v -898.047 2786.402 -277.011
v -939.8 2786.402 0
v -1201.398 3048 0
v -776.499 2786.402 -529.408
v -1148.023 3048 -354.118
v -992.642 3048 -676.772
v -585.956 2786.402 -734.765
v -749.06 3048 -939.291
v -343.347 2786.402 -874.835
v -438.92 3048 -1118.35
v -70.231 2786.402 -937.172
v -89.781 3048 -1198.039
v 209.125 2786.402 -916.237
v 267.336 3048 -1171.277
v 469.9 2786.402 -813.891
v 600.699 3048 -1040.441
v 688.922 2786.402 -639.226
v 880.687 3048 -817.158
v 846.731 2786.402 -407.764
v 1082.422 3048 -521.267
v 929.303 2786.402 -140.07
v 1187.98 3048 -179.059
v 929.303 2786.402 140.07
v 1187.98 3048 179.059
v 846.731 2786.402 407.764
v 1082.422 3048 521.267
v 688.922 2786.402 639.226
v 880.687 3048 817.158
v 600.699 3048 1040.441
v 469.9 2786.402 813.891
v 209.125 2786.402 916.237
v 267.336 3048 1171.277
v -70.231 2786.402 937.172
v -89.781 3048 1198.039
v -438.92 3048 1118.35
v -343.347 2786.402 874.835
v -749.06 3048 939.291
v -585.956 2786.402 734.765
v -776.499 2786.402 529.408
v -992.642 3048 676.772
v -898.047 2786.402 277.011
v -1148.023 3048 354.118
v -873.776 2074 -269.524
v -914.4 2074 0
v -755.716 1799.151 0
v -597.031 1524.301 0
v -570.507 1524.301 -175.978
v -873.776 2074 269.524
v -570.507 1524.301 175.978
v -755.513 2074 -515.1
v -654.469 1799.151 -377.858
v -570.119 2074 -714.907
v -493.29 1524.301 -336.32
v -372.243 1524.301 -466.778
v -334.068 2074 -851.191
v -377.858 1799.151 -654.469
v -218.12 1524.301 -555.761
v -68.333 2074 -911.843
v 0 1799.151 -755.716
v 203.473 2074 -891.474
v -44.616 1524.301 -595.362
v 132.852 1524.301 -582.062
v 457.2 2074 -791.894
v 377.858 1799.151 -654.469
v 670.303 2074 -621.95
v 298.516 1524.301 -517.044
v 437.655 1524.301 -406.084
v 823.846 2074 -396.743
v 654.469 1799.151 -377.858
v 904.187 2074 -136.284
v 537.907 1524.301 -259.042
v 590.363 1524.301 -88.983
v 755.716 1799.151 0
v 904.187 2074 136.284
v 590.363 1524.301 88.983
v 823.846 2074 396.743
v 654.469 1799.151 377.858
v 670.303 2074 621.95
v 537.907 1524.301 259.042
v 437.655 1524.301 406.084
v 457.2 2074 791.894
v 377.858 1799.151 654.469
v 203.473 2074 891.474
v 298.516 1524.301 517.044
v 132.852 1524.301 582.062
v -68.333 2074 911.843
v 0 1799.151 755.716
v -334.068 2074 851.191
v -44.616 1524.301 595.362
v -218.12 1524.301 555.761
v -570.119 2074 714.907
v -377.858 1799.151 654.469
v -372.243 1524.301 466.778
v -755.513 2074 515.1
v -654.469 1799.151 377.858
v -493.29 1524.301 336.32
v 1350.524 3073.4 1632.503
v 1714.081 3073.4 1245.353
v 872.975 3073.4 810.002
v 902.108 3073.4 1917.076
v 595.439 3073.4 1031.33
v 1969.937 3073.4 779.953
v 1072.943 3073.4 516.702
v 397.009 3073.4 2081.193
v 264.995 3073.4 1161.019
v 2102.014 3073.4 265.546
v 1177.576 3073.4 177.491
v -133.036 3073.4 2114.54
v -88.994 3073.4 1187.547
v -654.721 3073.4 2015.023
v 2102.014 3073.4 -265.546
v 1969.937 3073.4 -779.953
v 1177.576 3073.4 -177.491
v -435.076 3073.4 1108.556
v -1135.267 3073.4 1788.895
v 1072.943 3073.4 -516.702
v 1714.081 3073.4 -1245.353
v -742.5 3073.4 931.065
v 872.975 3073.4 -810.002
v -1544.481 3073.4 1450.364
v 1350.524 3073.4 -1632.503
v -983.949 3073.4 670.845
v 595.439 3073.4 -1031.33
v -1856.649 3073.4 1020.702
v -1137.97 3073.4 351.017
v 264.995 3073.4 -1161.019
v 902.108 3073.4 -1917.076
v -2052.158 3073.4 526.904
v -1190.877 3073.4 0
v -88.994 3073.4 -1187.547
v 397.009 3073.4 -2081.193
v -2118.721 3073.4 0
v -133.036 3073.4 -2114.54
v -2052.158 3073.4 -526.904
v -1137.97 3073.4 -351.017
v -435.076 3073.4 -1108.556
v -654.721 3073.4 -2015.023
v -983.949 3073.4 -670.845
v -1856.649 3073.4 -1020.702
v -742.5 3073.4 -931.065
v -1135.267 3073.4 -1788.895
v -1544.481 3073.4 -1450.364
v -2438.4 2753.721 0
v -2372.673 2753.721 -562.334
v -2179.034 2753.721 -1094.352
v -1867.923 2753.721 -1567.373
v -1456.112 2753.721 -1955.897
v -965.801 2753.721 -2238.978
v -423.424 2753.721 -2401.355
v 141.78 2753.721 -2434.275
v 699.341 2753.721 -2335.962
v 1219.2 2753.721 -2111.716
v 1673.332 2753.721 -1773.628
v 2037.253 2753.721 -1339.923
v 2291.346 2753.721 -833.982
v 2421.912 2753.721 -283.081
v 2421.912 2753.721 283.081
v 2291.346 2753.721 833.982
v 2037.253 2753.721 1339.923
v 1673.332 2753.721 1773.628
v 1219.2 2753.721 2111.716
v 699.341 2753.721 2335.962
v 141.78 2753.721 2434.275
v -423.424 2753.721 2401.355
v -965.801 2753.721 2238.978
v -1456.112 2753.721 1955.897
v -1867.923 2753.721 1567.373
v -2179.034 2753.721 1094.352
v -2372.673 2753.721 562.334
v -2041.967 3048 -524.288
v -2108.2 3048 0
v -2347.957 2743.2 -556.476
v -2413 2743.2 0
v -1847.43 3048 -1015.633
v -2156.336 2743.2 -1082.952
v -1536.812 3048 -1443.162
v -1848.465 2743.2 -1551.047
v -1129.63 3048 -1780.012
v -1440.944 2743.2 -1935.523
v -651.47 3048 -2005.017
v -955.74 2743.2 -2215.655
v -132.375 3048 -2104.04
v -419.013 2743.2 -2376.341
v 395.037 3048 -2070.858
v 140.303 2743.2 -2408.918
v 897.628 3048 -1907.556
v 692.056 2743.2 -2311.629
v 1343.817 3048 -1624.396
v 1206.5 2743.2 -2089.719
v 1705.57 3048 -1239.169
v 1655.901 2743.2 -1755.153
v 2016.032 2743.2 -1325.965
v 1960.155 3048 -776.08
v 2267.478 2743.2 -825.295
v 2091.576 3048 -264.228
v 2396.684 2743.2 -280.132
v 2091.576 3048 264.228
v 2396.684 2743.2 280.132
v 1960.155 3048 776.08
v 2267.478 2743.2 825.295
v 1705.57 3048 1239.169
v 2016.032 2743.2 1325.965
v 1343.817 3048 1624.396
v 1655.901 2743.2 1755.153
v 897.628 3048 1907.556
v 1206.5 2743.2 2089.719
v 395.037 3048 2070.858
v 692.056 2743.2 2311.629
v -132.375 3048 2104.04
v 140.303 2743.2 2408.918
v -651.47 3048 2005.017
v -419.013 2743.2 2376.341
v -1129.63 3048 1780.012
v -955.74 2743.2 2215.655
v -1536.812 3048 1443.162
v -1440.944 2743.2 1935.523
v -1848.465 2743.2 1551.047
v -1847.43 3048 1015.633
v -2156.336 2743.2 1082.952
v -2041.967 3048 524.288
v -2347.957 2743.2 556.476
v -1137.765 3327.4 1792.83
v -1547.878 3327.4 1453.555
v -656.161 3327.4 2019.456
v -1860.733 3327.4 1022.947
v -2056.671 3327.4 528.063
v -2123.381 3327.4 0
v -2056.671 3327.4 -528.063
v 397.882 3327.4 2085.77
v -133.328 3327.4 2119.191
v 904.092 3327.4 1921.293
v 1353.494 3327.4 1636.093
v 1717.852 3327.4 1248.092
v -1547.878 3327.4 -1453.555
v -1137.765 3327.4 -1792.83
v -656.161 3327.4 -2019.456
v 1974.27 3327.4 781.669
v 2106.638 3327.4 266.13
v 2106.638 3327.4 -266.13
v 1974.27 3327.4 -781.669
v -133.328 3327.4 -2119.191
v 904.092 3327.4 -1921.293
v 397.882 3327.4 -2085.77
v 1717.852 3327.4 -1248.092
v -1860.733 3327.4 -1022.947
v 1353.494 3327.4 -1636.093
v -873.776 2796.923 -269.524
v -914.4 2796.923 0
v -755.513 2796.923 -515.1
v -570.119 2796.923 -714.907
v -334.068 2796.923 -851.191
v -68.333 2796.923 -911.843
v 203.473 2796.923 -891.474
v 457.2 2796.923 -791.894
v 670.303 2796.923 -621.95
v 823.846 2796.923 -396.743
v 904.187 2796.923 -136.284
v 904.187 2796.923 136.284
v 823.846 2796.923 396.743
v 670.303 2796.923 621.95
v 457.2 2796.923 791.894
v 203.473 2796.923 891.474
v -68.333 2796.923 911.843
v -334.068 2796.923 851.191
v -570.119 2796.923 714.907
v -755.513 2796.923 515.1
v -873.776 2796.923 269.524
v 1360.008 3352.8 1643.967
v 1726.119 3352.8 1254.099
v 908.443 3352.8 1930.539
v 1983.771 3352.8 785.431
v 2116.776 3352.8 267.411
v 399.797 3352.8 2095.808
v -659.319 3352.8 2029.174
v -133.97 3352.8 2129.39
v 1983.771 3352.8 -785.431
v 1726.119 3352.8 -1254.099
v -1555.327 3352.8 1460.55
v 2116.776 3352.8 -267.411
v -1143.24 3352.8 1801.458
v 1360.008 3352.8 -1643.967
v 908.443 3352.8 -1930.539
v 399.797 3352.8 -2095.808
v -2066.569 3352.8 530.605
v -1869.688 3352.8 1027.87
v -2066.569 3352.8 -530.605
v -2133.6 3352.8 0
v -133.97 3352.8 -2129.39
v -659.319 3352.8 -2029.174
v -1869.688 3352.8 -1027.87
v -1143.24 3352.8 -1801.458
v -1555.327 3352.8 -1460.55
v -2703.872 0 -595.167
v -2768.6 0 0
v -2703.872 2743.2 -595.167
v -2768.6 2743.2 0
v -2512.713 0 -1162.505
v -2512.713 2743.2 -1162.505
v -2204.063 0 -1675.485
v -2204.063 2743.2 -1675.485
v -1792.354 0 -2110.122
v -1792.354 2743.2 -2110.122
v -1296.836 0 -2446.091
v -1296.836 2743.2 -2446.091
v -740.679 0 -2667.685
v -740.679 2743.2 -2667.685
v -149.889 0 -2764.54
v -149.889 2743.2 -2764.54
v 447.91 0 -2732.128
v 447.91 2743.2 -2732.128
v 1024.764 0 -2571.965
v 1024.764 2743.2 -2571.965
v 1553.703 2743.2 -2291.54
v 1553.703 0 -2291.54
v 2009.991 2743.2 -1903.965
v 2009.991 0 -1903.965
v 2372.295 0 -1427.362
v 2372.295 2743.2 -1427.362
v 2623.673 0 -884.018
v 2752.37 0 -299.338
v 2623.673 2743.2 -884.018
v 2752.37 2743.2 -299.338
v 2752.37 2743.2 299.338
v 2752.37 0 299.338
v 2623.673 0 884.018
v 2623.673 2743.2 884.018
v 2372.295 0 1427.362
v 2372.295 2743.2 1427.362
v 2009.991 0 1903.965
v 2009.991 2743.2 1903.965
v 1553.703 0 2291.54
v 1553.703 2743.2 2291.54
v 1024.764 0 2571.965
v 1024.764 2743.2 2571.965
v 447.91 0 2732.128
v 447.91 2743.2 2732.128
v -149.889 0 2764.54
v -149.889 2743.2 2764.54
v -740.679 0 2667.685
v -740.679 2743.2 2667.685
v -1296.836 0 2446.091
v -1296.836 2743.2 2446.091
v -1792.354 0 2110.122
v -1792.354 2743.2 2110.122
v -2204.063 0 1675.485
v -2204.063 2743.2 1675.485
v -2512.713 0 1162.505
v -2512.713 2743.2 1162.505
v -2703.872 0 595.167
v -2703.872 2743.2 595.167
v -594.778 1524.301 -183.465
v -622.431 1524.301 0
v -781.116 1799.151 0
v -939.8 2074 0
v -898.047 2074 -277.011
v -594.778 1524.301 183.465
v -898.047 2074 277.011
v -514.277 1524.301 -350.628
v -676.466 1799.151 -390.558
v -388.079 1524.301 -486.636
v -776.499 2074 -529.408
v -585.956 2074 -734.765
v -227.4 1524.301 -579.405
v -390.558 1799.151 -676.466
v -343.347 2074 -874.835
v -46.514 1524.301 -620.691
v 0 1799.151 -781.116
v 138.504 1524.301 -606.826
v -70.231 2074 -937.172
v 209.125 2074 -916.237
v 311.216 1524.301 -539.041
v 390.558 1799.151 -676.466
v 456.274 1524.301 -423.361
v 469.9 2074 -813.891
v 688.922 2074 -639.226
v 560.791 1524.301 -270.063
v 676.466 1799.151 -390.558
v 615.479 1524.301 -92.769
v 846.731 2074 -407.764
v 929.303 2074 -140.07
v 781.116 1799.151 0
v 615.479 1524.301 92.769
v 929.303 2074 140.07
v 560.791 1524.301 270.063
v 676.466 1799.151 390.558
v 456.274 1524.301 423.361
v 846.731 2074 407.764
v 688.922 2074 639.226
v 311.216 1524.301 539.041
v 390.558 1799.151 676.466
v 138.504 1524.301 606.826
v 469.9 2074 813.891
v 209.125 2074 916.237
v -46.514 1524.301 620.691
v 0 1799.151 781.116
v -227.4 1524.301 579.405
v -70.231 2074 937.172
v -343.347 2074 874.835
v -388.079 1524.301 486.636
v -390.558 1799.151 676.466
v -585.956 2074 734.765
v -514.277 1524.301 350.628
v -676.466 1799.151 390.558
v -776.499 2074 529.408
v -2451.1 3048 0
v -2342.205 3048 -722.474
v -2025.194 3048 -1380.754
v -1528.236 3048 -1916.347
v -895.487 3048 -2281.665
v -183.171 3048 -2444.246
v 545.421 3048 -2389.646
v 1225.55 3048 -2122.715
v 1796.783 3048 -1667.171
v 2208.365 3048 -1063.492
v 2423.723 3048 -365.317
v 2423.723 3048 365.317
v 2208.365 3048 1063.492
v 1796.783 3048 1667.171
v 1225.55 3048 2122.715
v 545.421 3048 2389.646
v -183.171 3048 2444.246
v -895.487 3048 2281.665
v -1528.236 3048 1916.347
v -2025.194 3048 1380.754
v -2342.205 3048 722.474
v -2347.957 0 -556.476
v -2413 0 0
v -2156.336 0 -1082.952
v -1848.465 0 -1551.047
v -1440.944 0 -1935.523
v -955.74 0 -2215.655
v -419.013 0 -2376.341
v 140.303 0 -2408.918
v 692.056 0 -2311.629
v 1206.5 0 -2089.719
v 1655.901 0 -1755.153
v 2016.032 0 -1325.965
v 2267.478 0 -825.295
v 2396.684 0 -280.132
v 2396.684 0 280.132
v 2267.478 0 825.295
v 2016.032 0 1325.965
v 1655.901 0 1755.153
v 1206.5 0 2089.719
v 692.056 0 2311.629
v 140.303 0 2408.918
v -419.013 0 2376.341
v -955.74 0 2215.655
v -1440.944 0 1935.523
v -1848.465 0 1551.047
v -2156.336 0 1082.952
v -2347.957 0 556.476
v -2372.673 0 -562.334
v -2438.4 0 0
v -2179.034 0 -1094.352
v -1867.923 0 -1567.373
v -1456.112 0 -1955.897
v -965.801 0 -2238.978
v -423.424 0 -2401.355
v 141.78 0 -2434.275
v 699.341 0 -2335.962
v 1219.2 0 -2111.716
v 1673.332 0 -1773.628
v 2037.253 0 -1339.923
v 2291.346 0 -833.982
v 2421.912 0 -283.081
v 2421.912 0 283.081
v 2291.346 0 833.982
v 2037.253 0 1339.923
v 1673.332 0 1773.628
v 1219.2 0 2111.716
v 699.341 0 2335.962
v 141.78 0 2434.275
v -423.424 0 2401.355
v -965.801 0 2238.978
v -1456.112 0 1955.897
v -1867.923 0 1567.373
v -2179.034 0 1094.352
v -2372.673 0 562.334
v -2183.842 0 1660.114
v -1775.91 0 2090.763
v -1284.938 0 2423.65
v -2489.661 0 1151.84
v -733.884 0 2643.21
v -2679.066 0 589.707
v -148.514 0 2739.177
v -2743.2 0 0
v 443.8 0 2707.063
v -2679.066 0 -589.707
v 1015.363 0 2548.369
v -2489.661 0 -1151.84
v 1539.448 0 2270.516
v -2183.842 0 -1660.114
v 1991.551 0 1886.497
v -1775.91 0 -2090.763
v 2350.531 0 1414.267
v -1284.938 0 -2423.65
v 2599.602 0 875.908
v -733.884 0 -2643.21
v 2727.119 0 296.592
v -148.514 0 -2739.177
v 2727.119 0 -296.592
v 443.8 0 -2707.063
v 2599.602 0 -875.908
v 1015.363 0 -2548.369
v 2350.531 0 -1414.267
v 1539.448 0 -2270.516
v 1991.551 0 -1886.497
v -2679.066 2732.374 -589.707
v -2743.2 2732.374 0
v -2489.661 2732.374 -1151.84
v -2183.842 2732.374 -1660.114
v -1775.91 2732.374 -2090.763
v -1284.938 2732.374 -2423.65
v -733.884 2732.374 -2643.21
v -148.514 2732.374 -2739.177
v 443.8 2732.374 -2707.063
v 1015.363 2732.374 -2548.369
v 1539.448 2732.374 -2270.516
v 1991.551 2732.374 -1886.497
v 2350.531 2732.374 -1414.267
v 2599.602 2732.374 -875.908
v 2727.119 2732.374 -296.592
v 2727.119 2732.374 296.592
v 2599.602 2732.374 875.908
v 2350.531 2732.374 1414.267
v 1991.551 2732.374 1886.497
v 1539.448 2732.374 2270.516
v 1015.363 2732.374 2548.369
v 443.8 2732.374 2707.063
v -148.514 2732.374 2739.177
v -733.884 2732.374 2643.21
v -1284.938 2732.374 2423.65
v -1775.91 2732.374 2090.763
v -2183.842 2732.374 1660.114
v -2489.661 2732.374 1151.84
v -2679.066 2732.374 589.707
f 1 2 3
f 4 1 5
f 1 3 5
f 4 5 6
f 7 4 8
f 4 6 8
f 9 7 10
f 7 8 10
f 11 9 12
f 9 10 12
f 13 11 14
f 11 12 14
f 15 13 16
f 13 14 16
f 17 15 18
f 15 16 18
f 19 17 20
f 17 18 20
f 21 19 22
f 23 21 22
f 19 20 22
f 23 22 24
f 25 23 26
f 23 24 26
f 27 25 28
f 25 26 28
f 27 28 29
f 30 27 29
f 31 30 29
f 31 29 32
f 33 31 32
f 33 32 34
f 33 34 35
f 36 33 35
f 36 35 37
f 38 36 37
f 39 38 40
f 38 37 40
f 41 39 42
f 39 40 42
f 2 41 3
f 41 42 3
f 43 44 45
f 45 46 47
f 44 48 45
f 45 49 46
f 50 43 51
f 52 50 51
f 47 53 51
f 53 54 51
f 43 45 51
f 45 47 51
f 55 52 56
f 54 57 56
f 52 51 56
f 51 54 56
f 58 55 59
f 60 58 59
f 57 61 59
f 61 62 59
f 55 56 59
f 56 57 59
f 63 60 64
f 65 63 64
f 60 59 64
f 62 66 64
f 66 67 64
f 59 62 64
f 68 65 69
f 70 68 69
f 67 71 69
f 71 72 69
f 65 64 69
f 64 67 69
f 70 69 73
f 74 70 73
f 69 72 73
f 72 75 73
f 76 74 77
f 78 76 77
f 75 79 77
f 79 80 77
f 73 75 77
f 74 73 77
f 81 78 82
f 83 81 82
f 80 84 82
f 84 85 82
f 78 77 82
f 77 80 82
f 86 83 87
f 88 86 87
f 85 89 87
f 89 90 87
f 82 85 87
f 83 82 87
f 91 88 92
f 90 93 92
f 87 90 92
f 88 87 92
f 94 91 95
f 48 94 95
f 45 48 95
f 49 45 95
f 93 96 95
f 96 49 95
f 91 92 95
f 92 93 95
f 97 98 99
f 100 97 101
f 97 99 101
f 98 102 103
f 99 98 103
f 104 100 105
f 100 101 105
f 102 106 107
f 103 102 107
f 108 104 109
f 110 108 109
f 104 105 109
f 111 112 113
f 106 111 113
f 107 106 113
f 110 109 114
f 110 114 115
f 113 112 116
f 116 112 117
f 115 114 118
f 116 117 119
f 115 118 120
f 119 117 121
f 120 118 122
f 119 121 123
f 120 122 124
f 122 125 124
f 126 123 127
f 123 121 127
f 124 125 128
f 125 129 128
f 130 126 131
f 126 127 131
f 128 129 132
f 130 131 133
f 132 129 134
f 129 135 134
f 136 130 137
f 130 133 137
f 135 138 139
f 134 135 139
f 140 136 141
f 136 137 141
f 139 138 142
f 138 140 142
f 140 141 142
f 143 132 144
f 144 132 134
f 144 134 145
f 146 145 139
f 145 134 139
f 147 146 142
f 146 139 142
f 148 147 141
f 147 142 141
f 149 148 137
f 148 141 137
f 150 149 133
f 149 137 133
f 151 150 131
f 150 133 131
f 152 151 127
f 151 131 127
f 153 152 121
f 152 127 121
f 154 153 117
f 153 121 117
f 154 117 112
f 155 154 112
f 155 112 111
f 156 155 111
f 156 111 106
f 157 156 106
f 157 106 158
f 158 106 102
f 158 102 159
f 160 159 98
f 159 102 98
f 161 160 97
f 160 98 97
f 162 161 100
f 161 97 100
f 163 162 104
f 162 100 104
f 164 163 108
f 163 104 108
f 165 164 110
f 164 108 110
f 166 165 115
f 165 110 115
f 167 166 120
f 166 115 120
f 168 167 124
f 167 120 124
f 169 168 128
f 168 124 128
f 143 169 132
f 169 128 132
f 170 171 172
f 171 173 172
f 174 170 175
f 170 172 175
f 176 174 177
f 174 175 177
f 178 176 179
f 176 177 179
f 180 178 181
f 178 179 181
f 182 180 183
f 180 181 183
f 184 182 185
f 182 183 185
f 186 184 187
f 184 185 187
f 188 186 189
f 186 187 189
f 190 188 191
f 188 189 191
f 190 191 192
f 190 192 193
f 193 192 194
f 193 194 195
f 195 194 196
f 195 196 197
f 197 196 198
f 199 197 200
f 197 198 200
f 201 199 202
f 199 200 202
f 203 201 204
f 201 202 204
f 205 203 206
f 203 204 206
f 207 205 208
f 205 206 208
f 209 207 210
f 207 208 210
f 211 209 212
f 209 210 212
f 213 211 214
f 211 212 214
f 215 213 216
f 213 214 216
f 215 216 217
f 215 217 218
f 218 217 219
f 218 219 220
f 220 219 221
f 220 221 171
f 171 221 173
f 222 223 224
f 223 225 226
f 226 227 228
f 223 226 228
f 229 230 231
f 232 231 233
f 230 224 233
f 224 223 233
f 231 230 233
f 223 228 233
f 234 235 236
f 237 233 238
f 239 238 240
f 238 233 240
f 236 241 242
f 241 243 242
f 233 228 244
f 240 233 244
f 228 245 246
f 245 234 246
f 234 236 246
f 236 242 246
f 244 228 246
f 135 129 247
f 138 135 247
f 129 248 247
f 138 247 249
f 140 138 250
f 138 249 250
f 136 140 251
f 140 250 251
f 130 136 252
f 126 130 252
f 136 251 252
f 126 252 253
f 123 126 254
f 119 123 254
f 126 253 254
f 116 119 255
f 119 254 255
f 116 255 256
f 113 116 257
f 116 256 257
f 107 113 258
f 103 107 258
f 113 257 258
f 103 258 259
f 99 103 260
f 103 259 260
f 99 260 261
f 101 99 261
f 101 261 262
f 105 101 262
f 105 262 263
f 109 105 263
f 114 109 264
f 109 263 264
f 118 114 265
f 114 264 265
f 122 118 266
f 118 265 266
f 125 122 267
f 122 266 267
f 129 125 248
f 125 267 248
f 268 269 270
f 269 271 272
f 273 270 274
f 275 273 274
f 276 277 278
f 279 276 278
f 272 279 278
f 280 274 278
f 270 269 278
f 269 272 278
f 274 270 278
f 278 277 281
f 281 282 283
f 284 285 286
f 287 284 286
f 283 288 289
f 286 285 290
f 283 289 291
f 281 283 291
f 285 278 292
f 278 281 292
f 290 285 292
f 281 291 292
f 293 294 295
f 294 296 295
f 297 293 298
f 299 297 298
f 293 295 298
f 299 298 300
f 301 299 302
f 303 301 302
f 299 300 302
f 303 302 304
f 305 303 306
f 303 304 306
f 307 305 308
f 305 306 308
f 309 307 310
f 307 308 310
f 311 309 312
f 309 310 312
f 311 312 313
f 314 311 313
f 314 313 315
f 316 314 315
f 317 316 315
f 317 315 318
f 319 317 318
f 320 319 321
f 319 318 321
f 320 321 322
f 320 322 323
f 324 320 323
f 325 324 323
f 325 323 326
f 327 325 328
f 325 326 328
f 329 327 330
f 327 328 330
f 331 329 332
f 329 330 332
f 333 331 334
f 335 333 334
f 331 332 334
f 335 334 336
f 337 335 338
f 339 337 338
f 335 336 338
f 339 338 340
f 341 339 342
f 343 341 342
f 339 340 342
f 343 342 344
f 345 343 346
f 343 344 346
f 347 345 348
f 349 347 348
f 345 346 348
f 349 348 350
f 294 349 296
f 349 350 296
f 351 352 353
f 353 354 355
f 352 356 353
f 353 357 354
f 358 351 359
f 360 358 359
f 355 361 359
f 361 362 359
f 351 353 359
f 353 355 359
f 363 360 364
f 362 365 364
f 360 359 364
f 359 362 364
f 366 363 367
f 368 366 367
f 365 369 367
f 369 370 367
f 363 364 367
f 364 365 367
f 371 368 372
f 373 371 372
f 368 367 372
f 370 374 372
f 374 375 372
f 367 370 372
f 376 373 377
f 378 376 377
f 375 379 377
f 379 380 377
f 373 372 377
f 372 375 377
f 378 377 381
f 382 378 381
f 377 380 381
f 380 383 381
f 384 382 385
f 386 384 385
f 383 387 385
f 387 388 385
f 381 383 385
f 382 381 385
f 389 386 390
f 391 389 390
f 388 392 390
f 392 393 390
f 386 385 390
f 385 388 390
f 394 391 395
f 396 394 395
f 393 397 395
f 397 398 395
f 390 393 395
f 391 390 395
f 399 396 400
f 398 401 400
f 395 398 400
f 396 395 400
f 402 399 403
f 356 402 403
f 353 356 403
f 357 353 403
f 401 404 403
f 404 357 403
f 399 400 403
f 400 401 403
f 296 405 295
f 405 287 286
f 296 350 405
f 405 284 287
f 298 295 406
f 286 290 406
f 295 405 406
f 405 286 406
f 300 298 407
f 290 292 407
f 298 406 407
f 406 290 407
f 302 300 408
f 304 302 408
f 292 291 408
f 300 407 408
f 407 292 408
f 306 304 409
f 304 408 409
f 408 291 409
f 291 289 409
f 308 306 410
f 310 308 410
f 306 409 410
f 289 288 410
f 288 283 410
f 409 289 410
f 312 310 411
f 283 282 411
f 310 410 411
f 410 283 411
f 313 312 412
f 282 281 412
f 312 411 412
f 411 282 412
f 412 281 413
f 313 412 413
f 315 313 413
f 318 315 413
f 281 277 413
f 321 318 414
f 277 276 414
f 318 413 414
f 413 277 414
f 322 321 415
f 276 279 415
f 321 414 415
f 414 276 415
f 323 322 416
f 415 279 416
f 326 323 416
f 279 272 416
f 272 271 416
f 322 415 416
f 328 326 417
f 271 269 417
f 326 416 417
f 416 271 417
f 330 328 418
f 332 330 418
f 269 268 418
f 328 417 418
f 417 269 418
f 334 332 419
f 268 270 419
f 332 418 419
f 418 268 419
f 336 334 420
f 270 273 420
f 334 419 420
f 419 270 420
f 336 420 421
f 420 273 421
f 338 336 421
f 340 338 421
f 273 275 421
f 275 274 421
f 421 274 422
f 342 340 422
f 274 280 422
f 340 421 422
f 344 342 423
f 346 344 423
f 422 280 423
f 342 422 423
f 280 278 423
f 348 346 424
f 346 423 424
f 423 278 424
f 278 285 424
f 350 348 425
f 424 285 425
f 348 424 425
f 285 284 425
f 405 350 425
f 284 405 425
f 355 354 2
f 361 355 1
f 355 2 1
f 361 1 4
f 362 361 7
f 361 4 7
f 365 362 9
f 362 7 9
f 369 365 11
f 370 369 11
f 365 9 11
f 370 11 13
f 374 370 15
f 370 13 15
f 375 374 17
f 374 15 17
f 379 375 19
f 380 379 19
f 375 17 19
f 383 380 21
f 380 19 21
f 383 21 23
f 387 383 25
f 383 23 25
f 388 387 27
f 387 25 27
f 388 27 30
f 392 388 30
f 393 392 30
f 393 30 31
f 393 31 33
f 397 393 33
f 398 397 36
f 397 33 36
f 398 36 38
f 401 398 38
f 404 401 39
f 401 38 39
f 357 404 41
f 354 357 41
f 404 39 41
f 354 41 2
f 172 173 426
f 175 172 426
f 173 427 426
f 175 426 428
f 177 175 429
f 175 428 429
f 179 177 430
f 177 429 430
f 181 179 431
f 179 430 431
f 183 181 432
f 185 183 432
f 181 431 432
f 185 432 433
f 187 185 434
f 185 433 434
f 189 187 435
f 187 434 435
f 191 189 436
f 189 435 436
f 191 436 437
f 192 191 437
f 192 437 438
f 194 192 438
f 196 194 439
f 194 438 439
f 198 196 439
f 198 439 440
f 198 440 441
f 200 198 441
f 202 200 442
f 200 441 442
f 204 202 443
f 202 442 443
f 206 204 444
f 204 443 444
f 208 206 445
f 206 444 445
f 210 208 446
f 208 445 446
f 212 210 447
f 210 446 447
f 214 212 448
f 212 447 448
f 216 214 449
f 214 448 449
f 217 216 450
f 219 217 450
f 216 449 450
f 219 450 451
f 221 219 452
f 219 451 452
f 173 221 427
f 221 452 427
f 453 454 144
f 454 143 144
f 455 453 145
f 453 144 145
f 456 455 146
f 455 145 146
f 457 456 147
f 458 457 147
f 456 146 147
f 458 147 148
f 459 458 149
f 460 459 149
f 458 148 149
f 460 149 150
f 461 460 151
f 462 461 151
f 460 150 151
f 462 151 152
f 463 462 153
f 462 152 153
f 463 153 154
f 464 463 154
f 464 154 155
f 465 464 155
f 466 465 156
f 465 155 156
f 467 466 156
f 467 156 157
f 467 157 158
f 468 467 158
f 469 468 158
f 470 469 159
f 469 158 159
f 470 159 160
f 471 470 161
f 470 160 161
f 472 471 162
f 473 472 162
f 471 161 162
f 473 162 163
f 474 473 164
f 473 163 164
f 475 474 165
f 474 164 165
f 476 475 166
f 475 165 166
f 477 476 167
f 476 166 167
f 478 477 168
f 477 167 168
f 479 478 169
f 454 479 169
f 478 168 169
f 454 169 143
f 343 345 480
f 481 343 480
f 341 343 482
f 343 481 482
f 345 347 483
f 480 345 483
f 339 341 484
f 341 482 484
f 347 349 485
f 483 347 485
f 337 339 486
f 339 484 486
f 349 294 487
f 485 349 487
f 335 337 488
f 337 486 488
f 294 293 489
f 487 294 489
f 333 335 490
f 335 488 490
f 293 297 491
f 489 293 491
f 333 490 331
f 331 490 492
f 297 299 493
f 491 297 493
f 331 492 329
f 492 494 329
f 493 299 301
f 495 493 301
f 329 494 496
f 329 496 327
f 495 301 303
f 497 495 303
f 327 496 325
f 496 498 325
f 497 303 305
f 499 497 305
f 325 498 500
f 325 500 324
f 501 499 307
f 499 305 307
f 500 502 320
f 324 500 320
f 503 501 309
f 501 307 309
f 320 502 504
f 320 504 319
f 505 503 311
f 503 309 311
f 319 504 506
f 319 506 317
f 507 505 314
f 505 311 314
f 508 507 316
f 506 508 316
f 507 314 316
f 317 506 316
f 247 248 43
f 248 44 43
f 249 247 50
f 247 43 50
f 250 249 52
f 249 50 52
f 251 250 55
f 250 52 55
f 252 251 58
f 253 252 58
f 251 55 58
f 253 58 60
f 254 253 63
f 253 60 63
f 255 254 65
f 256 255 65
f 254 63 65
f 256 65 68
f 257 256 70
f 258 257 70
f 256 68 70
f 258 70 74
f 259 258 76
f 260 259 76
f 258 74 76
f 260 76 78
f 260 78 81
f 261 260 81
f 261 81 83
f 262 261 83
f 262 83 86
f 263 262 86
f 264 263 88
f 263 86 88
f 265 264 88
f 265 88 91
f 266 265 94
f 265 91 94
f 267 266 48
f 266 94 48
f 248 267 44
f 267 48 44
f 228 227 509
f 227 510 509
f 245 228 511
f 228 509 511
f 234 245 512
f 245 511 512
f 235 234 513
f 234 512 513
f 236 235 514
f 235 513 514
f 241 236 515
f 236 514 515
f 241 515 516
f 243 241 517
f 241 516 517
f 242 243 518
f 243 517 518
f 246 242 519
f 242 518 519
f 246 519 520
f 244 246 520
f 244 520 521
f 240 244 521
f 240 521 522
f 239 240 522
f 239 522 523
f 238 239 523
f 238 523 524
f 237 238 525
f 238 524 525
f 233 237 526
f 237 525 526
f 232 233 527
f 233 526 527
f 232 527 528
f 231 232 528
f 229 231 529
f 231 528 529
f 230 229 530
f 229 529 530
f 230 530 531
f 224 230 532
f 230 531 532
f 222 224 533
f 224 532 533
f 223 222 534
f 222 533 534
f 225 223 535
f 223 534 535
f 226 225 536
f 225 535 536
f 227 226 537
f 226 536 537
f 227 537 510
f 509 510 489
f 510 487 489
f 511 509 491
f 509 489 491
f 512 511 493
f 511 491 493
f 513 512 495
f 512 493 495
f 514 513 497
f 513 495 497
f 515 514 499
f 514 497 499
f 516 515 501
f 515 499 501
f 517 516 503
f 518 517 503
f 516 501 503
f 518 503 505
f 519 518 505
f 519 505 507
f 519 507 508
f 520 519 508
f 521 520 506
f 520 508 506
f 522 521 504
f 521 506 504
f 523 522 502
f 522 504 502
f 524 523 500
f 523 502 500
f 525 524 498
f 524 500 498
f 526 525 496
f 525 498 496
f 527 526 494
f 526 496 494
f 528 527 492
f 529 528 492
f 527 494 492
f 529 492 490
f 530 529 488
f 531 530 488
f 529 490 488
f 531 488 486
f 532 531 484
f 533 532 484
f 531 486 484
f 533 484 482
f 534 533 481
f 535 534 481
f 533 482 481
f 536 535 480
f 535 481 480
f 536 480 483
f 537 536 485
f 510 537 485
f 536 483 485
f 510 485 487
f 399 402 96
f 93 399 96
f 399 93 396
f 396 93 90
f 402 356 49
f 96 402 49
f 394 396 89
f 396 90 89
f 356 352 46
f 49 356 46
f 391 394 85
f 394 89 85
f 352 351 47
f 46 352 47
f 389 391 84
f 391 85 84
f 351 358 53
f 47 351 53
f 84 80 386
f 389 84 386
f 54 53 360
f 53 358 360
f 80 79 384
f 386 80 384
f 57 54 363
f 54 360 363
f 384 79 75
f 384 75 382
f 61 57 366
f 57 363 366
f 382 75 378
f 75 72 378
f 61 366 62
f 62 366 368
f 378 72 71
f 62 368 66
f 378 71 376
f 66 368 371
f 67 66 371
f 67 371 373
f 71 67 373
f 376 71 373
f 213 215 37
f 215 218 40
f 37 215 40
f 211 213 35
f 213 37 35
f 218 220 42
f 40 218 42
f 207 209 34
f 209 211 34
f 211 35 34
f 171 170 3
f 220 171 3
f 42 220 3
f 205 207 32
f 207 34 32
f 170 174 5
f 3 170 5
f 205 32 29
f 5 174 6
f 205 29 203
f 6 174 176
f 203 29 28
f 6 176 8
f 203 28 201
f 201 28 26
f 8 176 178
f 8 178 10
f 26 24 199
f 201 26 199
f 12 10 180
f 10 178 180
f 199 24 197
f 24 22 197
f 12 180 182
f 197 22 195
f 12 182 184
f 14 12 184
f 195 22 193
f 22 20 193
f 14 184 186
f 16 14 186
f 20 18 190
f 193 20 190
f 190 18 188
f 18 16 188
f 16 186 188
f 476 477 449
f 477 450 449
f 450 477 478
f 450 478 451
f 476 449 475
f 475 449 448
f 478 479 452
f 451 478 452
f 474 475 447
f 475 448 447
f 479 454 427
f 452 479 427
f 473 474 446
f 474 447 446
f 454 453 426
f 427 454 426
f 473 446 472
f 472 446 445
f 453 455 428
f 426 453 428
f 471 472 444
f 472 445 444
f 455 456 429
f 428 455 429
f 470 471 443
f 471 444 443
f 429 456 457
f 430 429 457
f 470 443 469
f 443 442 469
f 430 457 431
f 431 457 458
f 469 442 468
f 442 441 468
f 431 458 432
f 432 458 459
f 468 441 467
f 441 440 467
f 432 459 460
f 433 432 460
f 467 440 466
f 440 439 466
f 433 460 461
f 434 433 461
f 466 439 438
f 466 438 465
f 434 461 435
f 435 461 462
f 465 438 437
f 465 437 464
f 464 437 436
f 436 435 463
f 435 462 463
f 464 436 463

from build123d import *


with BuildPart() as part:
    # Sketch1 → Revolve1 (revolve)
    with BuildSketch(Plane.XY):
        Polygon((-2438.4, 0), (-2438.4, 2753.721024484), (-2118.721024484, 3073.4), (-1190.8772065, 3073.4), (-914.4, 2796.9227935), (-914.4, 2074), (-597.031176681, 1524.301073273), (-622.431176681, 1524.301073273), (-939.8, 2074), (-939.8, 2786.401769016), (-1201.398230984, 3048), (-2108.2, 3048), (-2413, 2743.2), (-2413, 0), align=None)
    revolve(axis=Axis((0, 3520.44, 0), (0, -1, 0)))


with BuildPart() as body_2:
    # Sketch2 → Revolve2 (revolve)
    with BuildSketch(Plane.XY):
        Polygon((-2743.2, 0), (-2768.6, 0), (-2768.6, 2743.2), (-2133.6, 3352.8), (0, 3352.8), (0, 3327.4), (-2123.381318695, 3327.4), (-2743.2, 2732.374065947), align=None)
    revolve(axis=Axis((0, 3520.44, 0), (0, -1, 0)))


solid = Compound([part.part, body_2.part])
